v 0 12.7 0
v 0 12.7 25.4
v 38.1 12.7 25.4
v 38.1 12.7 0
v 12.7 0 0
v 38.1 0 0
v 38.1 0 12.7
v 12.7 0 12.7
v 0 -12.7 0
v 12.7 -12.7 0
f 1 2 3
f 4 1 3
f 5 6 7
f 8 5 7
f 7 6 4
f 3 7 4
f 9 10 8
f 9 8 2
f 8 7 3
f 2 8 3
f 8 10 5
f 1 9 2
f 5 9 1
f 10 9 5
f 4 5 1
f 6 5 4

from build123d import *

# Parameters (mm, degrees)
F0_W     = 38.1
F0_H     = 25.4
F1_DEPTH = 12.7
F3_DEPTH = 38.101
F5_DEPTH = 25.4


with BuildPart() as f1:
    # F0 (on Front) → F1 (new body, symmetric)
    with BuildSketch(Plane.XZ):
        with Locations((19.05, 12.7)):
            Rectangle(F0_W, F0_H)
    extrude(amount=F1_DEPTH, both=True)

    # F2 (on face) → F3 (cut, through all)
    with BuildSketch(Plane.YZ.offset(38.1)):
        Polygon((12.7, 25.4), (-12.7, 25.4), (-12.7, 0), align=None)
    extrude(amount=-F3_DEPTH, mode=Mode.SUBTRACT)

    # F4 (on face) → F5 (cut)
    with BuildSketch(Plane.YZ.offset(38.1)):
        Polygon((0, 0), (0, 12.7), (-12.7, 0), align=None)
    extrude(amount=-F5_DEPTH, mode=Mode.SUBTRACT)


solid = f1.part
